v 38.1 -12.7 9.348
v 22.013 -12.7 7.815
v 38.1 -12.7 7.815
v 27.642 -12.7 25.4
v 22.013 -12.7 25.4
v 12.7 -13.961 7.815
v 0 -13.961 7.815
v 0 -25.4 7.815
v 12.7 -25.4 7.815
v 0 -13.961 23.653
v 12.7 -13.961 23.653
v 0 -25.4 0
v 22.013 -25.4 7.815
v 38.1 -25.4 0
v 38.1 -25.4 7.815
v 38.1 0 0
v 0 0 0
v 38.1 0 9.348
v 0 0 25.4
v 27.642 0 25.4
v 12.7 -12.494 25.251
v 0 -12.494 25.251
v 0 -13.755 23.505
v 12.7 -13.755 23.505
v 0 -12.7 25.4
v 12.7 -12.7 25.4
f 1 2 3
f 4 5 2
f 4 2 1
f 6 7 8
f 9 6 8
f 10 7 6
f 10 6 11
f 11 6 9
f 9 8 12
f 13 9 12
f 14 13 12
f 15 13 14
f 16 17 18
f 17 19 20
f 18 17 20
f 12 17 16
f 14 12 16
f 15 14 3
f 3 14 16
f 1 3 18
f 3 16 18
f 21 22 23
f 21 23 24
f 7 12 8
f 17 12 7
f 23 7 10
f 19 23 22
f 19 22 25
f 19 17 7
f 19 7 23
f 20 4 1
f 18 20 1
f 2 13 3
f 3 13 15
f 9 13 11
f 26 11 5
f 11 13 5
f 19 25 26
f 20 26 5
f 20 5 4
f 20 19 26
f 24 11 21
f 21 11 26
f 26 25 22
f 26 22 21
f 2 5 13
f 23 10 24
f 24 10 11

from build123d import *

# Parameters (mm, degrees)
F0_W      = 38.1
F0_H      = 25.4
F1_DEPTH  = 25.4
F3_DEPTH  = 25.401
F4_W      = 11.4385973006
F4_H      = 17.5851260588
F5_DEPTH  = 12.7
F7_DEPTH  = 12.7
F9_DEPTH  = 25.4
F10_W     = 12.7
F10_H     = 2.1544784386
F11_DEPTH = 0.254


with BuildPart() as f1:
    # F0 (on Front) → F1 (new body)
    with BuildSketch(Plane.XZ):
        with Locations((19.05, 12.7)):
            Rectangle(F0_W, F0_H)
    extrude(amount=F1_DEPTH)

    # F2 (on face) → F3 (cut, through all)
    with BuildSketch(Plane.XZ.offset(25.4)):
        Polygon((38.1, 25.4), (27.6416484267, 25.4), (38.1, 9.3479026109), align=None)
    extrude(amount=-F3_DEPTH, mode=Mode.SUBTRACT)

    # F4 (on face) → F5 (cut)
    with BuildSketch(Plane(origin=(0, 0, 0), x_dir=(0, -1, 0), z_dir=(-1, 0, 0))):
        with Locations((19.6807013497, 16.6074369706)):
            Rectangle(F4_W, F4_H)
    extrude(amount=-F5_DEPTH, mode=Mode.SUBTRACT)

    # F6 (on face) → F7 (cut)
    with BuildSketch(Plane.XZ.offset(25.4)):
        Polygon((22.0128018409, 25.4), (22.0128018409, 7.8148739412), (38.1, 7.8148739412), (38.1, 9.3479026109), (27.6416484267, 25.4), align=None)
    extrude(amount=-F7_DEPTH, mode=Mode.SUBTRACT)

    # F8 (on face) → F9 (cut)
    with BuildSketch(Plane.YZ.offset(22.0128018409)):
        Polygon((-25.4, 25.4), (-25.4, 7.8148739412), (-12.7, 25.4), align=None)
    extrude(amount=-F9_DEPTH, mode=Mode.SUBTRACT)

    # F10 (on face) → F11 (cut)
    with BuildSketch(Plane(origin=(0, -20.4024901747, 14.7347038828), x_dir=(1, 0, 0), z_dir=(0, -0.8106872987, 0.5854793795))):
        with Locations((6.35, 12.0786300472)):
            Rectangle(F10_W, F10_H)
    extrude(amount=-F11_DEPTH, mode=Mode.SUBTRACT)


solid = f1.part
